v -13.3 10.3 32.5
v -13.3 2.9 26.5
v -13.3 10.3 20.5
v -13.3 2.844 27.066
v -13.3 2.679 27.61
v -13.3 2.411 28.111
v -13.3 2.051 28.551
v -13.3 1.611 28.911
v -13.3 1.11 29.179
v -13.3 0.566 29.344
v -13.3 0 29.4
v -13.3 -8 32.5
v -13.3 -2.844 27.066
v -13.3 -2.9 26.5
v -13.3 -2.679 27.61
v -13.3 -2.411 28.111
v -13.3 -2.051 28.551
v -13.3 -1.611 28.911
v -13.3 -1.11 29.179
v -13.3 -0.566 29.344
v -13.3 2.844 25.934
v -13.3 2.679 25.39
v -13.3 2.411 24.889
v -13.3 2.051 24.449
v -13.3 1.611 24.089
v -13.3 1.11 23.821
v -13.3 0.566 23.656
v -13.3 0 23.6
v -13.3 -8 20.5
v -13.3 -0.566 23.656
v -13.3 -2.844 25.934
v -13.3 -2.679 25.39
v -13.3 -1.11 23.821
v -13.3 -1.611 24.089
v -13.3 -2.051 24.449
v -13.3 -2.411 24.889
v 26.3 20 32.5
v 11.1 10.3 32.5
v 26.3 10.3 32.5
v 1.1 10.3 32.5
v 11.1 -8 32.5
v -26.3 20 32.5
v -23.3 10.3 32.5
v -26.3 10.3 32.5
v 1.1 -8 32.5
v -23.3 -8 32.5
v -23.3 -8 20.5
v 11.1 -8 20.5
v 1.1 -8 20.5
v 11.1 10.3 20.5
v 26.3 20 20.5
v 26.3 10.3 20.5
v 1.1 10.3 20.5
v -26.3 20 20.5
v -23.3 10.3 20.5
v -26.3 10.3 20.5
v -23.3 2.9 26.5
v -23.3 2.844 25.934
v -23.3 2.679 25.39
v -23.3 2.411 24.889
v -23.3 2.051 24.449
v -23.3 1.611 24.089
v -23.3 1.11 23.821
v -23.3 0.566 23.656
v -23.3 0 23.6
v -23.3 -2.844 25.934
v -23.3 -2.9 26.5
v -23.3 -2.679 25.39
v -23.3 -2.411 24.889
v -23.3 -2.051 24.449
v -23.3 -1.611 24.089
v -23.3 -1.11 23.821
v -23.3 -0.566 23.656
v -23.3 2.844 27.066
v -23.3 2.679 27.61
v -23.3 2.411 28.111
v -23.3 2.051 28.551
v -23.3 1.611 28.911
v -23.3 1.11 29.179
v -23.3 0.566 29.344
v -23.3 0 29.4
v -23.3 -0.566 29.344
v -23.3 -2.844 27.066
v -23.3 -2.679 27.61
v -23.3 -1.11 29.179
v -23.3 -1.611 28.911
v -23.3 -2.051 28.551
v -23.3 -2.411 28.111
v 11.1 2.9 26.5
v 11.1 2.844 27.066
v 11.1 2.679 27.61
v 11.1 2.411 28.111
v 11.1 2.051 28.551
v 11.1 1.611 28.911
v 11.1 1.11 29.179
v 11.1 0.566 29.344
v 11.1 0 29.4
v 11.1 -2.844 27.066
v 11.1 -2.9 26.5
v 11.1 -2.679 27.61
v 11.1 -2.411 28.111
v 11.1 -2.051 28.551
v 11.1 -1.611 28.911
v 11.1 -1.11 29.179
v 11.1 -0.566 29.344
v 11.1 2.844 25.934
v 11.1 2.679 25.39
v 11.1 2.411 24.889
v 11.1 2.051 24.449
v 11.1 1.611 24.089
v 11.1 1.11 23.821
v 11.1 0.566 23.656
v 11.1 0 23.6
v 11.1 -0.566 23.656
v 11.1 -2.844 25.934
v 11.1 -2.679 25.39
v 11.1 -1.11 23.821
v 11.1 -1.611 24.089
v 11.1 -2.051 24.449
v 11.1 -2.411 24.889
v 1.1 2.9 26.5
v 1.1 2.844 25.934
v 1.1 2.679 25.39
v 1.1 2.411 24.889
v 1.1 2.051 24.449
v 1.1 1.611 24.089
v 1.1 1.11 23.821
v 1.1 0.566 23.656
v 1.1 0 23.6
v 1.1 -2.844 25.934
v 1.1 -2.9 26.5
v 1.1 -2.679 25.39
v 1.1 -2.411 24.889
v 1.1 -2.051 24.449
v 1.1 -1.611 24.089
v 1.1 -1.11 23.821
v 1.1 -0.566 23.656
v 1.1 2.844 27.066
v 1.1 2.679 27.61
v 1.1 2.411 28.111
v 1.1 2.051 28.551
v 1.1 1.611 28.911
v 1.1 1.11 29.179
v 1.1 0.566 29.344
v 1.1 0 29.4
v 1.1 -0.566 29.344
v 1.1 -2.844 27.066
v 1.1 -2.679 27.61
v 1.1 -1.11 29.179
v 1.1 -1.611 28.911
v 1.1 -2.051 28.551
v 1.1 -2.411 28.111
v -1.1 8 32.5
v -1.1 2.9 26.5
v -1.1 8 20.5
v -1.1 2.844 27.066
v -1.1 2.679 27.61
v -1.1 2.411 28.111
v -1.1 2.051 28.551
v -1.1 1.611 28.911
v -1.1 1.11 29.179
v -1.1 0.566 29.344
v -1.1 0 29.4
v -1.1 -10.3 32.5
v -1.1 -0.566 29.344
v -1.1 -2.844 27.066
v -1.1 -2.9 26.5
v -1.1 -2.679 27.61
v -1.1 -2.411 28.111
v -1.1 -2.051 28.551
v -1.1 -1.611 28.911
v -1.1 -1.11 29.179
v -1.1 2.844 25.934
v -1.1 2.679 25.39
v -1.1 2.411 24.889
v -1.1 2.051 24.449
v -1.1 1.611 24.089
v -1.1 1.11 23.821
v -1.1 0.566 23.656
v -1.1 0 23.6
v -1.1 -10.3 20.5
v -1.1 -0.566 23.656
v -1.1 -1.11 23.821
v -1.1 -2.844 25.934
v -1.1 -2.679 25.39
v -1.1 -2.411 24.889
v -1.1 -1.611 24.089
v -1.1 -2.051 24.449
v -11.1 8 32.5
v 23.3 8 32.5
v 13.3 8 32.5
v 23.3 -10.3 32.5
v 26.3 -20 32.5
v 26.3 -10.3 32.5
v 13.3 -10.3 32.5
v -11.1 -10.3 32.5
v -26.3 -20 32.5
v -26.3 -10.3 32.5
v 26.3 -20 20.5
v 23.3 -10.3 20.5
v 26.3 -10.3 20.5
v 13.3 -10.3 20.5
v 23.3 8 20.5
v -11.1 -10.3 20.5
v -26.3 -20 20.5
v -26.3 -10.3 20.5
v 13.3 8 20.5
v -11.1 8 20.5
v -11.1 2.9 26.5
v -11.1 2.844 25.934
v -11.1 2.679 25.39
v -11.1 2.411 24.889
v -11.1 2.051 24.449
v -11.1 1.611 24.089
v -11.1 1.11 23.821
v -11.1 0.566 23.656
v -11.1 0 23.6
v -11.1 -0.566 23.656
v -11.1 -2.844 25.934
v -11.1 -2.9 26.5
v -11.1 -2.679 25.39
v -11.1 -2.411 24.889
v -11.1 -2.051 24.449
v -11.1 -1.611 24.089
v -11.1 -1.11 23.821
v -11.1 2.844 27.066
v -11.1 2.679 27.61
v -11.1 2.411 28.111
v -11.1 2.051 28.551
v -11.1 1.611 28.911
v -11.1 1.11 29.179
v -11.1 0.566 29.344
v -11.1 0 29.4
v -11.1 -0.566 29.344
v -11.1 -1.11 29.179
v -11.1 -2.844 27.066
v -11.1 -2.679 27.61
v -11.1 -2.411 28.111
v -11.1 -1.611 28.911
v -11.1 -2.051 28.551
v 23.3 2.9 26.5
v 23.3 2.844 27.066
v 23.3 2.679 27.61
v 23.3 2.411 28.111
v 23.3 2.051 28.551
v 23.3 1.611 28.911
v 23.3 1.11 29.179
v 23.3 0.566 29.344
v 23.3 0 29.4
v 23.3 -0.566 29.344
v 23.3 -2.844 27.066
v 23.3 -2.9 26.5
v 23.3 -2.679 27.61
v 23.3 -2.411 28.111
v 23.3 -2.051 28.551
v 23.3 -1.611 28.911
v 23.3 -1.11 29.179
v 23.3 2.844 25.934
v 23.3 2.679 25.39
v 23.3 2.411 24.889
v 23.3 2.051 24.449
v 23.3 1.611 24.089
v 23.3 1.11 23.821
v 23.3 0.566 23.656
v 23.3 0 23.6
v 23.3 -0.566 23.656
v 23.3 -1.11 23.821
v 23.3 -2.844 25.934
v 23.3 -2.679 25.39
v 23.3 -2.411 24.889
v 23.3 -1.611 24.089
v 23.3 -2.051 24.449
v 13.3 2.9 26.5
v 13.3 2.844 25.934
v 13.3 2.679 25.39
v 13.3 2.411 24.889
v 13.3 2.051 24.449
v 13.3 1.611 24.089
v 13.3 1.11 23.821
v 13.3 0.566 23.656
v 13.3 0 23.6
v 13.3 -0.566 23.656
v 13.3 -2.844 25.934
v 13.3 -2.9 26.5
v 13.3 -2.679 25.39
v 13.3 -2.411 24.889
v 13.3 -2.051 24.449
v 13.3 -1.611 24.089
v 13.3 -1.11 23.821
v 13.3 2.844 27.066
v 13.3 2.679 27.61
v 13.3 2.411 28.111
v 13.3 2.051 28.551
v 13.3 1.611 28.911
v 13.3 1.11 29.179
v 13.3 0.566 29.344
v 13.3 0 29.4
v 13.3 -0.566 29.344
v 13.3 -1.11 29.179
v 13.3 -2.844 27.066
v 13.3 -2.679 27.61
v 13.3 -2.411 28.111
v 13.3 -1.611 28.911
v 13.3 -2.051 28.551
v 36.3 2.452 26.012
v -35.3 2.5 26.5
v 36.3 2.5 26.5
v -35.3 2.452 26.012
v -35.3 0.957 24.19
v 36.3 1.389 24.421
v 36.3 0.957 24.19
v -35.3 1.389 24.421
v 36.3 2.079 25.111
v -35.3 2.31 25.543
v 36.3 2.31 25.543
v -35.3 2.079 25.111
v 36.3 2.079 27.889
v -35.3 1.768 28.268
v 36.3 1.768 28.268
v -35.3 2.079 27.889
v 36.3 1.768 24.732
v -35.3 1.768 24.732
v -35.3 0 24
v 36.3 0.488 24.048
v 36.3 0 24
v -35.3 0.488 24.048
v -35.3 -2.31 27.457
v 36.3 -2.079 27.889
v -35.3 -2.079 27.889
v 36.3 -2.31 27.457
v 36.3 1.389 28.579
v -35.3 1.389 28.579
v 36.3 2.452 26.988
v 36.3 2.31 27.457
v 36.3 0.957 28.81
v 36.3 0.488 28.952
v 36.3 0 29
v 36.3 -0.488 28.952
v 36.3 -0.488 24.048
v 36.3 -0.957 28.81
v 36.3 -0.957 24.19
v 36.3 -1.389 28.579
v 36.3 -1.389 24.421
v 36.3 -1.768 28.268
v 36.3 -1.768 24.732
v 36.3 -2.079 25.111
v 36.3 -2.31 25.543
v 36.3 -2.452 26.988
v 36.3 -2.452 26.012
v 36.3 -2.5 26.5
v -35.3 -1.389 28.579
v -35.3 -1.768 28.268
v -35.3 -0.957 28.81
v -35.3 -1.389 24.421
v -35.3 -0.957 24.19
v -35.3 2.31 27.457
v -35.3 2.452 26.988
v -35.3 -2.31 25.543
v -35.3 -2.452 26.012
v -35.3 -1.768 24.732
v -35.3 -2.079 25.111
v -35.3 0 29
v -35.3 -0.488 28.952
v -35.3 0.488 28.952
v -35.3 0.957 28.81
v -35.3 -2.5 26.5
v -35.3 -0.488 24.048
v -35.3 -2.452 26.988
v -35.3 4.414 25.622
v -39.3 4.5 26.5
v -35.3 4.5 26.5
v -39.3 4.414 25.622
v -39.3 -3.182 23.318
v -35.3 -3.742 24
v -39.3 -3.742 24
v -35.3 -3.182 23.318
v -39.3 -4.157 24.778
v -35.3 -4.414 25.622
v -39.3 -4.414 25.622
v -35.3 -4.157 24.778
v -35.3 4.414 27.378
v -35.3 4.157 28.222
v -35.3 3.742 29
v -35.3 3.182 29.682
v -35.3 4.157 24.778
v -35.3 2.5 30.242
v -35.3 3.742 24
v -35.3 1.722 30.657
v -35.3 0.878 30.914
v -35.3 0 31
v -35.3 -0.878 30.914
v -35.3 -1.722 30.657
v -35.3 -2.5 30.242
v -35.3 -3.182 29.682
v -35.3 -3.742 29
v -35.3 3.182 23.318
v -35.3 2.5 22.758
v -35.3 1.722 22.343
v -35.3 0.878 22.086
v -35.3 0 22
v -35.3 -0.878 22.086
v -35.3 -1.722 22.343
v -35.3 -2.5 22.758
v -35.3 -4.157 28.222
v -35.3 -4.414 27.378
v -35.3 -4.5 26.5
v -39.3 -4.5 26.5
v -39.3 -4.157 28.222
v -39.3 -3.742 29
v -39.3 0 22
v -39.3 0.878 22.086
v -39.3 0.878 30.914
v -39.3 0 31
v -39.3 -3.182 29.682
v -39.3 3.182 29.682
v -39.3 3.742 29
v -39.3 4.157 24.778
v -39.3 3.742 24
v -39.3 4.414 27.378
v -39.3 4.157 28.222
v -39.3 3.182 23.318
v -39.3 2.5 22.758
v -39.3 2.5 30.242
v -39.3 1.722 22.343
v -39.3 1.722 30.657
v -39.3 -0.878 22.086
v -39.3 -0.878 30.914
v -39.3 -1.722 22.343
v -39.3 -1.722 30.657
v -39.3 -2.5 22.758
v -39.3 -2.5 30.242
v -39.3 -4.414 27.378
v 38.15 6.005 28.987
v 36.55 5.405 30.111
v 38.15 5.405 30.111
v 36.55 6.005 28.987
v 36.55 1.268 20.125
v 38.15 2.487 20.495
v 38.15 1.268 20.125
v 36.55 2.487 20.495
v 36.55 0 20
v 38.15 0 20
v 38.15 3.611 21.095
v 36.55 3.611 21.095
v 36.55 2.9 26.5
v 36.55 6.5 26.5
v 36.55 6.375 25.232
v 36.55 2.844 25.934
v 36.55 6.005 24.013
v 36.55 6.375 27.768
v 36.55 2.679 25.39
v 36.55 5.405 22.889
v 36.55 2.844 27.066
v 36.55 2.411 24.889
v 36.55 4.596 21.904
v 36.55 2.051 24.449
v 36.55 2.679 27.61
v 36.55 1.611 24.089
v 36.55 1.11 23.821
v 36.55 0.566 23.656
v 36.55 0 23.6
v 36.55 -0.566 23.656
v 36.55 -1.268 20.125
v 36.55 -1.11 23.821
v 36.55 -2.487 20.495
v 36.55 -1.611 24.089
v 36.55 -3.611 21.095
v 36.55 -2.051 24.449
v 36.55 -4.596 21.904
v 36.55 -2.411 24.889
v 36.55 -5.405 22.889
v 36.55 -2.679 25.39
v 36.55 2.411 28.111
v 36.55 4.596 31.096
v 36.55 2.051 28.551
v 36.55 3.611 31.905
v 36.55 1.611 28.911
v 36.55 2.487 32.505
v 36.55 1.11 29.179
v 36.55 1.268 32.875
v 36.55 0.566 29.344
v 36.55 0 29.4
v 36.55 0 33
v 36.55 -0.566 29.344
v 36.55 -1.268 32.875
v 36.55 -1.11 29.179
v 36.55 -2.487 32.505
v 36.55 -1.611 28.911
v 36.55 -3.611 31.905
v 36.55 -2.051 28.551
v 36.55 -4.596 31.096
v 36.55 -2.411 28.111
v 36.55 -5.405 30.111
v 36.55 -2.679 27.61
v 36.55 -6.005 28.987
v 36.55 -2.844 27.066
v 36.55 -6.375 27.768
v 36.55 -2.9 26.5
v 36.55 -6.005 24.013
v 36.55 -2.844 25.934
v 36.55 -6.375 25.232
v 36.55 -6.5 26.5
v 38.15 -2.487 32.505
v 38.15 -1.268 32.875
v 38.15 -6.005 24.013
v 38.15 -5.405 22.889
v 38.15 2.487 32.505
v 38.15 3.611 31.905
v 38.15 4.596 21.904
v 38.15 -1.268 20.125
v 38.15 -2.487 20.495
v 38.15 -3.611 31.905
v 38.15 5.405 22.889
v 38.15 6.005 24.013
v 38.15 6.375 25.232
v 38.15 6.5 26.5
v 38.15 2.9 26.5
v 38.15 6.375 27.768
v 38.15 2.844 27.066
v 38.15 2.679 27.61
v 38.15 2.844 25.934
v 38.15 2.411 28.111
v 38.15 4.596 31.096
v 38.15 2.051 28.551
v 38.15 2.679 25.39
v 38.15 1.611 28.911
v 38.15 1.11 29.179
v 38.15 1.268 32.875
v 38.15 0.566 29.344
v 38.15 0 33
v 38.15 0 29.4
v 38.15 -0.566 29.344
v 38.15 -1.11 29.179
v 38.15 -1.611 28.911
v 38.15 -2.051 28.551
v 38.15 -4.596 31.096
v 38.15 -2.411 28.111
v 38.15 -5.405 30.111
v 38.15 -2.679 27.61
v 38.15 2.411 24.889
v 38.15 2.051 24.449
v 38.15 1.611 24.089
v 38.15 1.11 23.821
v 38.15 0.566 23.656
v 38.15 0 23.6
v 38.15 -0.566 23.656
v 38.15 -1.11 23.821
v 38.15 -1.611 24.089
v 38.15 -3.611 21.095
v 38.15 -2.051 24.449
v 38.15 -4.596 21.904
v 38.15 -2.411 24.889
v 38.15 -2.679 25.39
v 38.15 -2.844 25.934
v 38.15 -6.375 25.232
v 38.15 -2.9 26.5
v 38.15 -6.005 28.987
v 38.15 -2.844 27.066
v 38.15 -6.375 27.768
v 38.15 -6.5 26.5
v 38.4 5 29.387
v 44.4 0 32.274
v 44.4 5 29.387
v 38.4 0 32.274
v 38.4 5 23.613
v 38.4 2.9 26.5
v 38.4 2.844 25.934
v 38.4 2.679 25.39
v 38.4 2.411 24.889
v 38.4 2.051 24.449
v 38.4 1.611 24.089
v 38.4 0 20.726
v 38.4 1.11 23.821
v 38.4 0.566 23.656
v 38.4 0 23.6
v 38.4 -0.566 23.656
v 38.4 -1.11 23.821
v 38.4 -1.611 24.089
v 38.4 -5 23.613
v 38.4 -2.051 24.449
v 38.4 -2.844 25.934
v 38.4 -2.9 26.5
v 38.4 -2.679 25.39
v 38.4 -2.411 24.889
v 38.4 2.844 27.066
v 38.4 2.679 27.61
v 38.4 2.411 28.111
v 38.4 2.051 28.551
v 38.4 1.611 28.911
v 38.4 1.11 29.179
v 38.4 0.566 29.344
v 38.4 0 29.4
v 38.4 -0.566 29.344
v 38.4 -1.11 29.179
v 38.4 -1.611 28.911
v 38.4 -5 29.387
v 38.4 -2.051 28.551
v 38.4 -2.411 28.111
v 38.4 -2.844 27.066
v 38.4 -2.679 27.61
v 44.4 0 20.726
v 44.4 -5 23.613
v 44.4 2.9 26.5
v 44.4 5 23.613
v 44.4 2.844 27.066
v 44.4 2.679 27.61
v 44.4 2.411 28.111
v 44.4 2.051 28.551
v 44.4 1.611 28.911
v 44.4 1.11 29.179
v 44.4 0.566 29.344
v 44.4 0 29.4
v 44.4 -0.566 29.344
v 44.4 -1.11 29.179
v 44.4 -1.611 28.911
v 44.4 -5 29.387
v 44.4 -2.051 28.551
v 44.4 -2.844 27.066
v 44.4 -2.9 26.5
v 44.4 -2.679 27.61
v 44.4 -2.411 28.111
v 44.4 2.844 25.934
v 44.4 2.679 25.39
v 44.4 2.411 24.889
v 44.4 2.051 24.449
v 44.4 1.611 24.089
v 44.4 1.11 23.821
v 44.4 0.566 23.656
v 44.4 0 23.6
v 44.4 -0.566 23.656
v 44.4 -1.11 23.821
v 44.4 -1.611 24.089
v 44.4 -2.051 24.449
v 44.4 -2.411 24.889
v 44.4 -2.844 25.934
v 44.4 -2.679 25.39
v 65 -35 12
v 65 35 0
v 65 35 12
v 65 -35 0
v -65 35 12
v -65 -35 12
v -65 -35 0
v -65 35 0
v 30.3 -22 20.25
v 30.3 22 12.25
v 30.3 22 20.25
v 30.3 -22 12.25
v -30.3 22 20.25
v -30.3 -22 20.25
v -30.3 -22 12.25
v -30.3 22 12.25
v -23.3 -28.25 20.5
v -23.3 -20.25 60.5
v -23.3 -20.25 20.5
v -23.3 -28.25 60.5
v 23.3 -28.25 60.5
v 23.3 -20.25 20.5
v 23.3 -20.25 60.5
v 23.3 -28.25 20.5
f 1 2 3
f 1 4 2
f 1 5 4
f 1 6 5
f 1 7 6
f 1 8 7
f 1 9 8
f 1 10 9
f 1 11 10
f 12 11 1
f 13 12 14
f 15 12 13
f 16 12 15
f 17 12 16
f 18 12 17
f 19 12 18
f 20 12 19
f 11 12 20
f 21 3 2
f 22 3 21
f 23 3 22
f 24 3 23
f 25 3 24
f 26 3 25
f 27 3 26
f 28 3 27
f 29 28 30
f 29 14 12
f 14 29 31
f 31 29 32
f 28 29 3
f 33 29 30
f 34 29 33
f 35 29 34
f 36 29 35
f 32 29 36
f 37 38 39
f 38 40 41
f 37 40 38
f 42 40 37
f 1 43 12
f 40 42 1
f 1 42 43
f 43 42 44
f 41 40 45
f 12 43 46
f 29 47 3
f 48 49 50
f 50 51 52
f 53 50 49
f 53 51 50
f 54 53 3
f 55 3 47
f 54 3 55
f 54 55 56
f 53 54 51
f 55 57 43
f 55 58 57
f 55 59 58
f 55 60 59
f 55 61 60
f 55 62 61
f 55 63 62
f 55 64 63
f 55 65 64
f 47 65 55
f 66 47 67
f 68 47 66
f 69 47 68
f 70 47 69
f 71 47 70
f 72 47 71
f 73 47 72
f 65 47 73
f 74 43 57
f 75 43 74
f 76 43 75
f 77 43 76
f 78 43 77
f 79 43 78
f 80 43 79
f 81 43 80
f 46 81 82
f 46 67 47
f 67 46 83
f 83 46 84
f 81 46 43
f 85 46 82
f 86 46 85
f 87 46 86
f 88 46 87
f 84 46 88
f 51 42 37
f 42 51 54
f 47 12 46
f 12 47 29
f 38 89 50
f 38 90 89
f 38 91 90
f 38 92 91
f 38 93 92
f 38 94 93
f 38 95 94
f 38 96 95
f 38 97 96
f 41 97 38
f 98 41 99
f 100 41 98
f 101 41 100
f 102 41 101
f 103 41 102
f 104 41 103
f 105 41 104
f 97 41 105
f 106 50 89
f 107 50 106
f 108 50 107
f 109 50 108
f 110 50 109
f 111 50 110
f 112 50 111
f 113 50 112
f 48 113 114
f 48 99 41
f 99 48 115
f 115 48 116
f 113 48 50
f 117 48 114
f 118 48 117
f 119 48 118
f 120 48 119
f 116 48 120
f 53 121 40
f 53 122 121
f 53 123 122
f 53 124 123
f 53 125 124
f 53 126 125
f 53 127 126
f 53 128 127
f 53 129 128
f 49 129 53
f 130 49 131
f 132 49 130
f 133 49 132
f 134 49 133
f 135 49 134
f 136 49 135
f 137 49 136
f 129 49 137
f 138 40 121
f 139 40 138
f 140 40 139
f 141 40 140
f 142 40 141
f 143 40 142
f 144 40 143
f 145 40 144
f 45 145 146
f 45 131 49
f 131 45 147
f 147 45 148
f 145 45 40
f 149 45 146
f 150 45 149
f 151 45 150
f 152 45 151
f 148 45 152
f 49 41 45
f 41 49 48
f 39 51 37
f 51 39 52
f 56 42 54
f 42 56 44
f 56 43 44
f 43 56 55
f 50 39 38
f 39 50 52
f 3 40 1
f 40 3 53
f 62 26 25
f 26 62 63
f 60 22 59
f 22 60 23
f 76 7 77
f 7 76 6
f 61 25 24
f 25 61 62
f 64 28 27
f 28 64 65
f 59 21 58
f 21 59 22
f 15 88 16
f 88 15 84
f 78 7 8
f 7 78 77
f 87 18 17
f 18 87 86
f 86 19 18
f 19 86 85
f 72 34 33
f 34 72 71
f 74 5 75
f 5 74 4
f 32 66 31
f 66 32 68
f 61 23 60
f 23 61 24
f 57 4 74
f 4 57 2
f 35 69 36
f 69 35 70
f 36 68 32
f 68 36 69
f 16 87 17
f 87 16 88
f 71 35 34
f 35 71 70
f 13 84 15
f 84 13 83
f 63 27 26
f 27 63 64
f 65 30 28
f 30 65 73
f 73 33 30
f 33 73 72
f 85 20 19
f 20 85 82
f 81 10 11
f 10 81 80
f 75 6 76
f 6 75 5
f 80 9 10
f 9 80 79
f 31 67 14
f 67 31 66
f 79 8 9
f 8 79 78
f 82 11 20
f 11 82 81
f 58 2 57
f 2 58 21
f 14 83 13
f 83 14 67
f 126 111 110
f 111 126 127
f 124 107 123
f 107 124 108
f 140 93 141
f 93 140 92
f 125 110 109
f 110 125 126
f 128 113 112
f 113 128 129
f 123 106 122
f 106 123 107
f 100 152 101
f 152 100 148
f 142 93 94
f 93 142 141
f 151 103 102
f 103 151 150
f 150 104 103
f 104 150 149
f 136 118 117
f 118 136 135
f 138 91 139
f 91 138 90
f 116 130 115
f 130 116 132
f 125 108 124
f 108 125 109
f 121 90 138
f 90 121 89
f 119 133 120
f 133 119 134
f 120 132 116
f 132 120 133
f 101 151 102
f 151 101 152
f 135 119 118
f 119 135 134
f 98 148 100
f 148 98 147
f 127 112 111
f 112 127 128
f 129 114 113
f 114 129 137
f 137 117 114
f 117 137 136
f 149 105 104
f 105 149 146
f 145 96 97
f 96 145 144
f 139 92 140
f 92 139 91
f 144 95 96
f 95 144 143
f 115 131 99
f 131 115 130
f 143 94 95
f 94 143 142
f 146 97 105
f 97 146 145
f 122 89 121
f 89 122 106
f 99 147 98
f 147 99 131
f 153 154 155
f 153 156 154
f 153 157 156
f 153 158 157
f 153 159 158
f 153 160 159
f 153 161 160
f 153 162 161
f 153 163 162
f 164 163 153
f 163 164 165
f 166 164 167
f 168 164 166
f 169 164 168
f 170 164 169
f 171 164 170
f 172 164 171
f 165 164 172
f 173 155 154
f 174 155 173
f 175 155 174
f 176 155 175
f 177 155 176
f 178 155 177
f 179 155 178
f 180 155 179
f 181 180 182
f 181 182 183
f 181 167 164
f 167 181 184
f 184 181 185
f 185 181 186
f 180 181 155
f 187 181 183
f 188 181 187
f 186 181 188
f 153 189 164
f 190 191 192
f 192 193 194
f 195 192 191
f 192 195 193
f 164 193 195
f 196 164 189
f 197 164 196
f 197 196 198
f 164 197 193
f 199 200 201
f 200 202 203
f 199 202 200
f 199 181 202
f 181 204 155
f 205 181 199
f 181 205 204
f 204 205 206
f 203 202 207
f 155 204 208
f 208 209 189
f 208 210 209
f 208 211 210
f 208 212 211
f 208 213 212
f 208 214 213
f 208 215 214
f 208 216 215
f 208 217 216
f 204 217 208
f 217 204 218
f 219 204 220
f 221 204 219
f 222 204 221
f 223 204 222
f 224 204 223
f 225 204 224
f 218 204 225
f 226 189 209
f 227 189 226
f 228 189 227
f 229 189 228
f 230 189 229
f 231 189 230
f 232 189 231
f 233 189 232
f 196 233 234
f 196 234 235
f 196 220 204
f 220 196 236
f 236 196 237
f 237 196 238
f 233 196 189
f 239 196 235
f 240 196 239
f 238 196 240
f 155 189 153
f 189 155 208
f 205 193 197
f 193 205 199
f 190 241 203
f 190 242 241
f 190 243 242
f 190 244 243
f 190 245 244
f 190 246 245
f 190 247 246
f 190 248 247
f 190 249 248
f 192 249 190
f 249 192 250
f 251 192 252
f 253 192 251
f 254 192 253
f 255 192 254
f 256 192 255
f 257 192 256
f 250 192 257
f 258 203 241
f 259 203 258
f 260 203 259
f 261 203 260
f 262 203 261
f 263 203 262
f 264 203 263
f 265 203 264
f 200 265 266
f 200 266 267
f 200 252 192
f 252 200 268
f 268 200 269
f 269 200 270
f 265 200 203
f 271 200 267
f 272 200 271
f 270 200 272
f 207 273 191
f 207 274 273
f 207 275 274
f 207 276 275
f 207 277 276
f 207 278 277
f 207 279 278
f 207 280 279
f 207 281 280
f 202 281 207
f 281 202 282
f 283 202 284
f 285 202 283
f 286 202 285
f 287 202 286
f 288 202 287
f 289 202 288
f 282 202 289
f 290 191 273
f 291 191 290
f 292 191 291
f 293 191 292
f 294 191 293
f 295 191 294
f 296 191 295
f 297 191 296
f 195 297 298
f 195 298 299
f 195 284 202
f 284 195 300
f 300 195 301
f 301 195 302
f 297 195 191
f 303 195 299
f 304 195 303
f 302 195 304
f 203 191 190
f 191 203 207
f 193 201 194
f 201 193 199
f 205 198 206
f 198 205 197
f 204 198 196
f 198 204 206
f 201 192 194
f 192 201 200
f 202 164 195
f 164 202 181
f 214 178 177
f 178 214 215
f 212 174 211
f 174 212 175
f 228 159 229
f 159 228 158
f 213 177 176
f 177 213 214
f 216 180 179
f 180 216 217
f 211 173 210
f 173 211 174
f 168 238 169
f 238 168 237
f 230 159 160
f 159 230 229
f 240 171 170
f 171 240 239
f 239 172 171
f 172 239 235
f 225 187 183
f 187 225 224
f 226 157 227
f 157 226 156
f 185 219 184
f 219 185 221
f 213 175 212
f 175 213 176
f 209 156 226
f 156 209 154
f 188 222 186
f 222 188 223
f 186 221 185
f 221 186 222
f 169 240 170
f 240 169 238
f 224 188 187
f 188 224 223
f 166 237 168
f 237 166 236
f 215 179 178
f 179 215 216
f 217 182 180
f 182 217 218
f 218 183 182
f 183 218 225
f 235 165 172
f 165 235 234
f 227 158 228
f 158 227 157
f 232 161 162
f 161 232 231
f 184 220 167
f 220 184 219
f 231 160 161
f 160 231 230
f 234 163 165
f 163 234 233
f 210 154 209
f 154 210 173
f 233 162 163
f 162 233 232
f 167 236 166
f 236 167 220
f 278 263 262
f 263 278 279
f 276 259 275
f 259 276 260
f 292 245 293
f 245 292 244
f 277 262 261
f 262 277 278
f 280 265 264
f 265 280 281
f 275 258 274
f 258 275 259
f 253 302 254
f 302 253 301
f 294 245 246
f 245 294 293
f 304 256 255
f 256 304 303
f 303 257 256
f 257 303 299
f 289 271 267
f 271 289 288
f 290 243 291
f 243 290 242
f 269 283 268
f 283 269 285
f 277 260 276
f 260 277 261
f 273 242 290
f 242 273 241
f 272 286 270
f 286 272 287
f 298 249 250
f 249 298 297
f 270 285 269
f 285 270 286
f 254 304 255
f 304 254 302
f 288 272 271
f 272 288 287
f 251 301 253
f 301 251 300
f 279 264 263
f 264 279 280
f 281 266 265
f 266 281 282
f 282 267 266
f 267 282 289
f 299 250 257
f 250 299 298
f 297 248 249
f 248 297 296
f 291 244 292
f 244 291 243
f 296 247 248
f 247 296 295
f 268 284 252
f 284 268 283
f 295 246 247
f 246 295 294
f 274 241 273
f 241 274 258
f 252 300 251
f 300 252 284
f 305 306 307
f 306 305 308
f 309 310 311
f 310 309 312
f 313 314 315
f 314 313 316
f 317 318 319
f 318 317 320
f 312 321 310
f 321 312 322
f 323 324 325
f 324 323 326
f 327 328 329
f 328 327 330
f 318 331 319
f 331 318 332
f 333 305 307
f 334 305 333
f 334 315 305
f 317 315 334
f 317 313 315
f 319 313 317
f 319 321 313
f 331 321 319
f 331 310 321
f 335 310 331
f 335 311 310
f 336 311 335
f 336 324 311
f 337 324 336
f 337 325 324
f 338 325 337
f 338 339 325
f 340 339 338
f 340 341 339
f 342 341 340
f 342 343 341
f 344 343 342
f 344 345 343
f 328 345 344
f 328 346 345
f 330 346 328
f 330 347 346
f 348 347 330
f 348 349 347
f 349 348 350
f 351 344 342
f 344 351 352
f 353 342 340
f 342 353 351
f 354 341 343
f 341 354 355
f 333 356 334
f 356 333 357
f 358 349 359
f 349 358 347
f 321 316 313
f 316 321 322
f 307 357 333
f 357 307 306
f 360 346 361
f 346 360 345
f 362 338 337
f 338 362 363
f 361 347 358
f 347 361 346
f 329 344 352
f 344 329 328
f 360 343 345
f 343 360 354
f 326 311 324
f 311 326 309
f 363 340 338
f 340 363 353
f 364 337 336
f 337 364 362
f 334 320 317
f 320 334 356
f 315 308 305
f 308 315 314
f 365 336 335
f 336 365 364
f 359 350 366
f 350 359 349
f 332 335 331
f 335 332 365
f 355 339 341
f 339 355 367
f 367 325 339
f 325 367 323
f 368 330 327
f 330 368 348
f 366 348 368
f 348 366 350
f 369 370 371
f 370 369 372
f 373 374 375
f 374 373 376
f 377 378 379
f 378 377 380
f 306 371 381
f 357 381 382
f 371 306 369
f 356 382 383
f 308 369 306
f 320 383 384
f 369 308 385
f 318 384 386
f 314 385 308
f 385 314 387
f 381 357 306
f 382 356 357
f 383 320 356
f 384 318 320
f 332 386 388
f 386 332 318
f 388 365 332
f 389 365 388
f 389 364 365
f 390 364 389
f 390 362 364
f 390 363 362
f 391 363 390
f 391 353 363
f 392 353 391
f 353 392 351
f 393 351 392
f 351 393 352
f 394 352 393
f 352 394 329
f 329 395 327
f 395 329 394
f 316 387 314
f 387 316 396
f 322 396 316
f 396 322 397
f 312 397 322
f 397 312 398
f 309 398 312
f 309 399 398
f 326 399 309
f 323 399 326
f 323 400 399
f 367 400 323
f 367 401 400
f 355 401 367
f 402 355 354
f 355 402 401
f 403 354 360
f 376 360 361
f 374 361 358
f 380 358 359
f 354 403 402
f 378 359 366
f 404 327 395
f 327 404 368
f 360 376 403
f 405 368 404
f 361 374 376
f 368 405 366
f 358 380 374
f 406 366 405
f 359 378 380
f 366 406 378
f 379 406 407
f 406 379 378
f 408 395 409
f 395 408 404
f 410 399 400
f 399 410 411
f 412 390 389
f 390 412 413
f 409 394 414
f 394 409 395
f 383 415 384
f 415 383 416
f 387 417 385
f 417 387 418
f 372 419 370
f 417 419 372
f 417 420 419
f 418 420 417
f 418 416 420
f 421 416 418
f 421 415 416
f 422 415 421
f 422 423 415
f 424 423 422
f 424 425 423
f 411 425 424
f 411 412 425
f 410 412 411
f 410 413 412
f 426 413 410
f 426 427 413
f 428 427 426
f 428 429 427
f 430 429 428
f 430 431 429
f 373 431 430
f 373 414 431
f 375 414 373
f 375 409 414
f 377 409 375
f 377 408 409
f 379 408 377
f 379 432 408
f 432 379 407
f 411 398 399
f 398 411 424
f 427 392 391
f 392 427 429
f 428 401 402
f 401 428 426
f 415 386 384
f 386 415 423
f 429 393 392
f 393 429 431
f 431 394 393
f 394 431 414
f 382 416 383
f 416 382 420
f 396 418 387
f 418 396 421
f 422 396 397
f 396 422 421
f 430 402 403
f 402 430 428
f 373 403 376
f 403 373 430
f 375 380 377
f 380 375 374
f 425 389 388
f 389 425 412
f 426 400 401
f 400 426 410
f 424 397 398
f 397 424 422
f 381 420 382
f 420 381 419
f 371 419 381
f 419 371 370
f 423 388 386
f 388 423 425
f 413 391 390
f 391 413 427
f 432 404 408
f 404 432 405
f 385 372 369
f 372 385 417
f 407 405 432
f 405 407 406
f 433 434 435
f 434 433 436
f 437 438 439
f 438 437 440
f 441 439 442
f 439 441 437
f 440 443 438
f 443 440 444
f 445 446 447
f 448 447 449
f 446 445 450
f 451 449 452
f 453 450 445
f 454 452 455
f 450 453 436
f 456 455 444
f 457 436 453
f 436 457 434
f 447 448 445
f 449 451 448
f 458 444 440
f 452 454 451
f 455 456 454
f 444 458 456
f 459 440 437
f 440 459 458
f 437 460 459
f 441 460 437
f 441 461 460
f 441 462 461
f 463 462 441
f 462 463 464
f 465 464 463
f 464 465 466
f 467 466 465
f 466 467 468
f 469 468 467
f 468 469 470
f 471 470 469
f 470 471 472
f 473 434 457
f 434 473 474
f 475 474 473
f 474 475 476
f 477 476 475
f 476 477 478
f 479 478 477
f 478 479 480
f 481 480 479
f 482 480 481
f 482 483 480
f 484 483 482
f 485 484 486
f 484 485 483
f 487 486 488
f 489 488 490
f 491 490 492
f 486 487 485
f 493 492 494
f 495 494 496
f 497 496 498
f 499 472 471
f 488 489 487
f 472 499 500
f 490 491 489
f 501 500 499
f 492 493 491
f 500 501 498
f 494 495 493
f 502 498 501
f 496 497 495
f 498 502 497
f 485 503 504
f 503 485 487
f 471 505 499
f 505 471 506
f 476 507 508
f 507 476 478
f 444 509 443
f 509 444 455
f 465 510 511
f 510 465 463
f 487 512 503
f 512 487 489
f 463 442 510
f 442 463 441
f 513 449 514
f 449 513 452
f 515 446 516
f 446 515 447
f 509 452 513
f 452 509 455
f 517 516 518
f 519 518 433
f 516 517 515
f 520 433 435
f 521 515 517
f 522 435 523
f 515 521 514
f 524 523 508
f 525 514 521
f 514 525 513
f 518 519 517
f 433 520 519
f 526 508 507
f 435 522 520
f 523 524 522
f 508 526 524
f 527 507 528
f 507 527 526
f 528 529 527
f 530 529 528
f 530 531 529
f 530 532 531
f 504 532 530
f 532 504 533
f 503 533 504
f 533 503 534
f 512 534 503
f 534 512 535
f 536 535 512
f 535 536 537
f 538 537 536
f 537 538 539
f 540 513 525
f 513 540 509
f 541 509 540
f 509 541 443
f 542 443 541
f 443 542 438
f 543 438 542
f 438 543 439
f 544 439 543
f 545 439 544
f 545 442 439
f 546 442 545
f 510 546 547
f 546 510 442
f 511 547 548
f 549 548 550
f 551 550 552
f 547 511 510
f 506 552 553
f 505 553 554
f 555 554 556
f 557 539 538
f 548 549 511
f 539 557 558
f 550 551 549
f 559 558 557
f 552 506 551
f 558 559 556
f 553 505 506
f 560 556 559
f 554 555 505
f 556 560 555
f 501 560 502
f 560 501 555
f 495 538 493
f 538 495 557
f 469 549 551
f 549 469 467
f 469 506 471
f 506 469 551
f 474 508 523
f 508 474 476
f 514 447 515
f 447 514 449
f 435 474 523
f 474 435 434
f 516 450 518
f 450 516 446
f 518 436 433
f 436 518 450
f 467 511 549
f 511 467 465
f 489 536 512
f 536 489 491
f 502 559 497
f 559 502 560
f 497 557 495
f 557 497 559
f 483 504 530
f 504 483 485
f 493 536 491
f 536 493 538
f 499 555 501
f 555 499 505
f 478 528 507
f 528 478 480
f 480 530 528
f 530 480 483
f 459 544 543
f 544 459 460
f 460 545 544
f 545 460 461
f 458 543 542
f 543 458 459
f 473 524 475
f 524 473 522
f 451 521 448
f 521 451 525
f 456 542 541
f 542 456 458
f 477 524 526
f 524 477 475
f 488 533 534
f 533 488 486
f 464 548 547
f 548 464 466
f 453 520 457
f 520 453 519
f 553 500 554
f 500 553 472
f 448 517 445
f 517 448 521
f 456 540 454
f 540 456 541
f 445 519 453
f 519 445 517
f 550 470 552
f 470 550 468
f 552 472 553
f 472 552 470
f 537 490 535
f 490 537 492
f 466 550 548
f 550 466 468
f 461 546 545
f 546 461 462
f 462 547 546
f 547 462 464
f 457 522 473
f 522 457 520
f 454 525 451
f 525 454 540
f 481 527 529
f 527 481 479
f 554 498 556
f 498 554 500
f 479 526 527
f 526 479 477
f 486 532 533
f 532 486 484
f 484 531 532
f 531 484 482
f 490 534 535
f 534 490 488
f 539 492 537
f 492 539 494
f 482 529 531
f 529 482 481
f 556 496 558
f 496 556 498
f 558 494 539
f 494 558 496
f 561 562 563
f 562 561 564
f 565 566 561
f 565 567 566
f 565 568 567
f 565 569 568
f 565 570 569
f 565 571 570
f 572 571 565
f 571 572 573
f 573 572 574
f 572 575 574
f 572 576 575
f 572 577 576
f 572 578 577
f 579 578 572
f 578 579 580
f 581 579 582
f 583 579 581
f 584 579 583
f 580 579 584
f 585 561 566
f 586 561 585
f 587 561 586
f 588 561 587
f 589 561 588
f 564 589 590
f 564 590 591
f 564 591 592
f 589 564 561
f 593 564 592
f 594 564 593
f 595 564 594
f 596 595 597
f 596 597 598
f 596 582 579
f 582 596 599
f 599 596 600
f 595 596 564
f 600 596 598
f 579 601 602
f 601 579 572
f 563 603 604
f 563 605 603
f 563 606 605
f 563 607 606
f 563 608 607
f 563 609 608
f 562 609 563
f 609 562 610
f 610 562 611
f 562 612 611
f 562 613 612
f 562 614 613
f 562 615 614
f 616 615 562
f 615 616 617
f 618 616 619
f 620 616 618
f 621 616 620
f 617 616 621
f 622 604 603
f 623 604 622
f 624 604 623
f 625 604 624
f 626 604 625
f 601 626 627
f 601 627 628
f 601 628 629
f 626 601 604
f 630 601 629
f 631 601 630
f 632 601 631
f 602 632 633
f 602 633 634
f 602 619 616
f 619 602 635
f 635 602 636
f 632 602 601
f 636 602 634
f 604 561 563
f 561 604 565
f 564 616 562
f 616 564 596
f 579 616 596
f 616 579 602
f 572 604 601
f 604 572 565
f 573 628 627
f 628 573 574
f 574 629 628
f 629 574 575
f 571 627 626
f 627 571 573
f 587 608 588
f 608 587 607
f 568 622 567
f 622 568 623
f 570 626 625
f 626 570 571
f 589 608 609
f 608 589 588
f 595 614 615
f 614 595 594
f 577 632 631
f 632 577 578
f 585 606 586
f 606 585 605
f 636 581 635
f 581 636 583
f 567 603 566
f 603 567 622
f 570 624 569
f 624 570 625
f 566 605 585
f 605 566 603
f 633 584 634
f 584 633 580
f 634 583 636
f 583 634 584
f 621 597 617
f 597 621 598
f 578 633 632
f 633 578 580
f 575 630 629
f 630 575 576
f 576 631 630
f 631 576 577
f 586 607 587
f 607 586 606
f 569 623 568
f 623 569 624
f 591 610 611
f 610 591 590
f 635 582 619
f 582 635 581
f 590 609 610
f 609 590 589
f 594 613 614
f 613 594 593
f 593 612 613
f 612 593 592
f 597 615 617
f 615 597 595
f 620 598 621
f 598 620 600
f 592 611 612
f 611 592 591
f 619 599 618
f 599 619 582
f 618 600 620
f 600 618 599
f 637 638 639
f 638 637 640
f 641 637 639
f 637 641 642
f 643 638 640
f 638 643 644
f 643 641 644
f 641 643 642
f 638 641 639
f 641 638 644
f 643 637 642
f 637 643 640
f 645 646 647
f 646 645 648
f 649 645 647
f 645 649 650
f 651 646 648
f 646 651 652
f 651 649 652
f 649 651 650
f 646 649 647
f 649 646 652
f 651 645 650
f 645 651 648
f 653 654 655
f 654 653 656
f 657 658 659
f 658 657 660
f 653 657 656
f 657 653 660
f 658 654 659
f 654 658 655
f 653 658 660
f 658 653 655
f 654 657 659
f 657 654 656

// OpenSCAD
$fn = 32;

// ------------------------------------------------------------------------
// Comb hinge with flap: leaf 52.6 x 20 mm, pin d5, flap 40 mm
// Every part is its own module, assembly() places every instance.
// ------------------------------------------------------------------------

// --- part 1 ---
module hinge_bed() {
  difference() {
    translate([-65, -35, 0]) cube([130, 70, 12]);
  }
}

// --- part 2 ---
module hinge_riser() {
  difference() {
    translate([-30.3, -22, 0]) cube([60.6, 44, 8]);
  }
}

// --- part 3 ---
module hinge_leaf_a() {
  difference() {
    union() {
      translate([-23.3, -8, -6]) cube([10, 28, 12]);
      translate([1.1, -8, -6]) cube([10, 28, 12]);
      translate([-26.3, 10.3, -6]) cube([52.6, 9.7, 12]);
    }
    translate([-18.3, 0, 0]) rotate([0, 90, 0]) cylinder(h = 12, d = 5.8, center = true);
    translate([6.1, 0, 0]) rotate([0, 90, 0]) cylinder(h = 12, d = 5.8, center = true);
  }
}

// --- part 4 ---
module hinge_leaf_b() {
  difference() {
    union() {
      translate([-11.1, -20, -6]) cube([10, 28, 12]);
      translate([13.3, -20, -6]) cube([10, 28, 12]);
      translate([-26.3, -20, -6]) cube([52.6, 9.7, 12]);
    }
    translate([-6.1, 0, 0]) rotate([0, 90, 0]) cylinder(h = 12, d = 5.8, center = true);
    translate([18.3, 0, 0]) rotate([0, 90, 0]) cylinder(h = 12, d = 5.8, center = true);
  }
}

// --- part 5 ---
module hinge_flap() {
  difference() {
    translate([-23.3, -20, 0]) cube([46.6, 40, 8]);
  }
}

// --- part 6 ---
module hinge_pin() {
  rotate([0, 90, 0]) cylinder(h = 72.6, d = 5, center = true);
  translate([-39.3, 0, 0]) rotate([0, 90, 0]) cylinder(h = 4, d = 9);
}

// --- part 7 ---
module pin_washer() {
  difference() {
      translate([0, 0, 0]) cylinder(h = 1.6, d = 13);
      translate([0, 0, -1]) cylinder(h = 3.6, d = 5.8);
    }
}

// --- part 8 ---
module pin_nut() {
  difference() {
    linear_extrude(height = 6) polygon(points = [[5.774, 0], [2.887, 5], [-2.887, 5], [-5.774, 0], [-2.887, -5], [2.887, -5]]);
    translate([0, 0, -1]) cylinder(h = 8, d = 5.8);
  }
}

// --- assembly ---
module assembly() {
  color([0.80, 0.24, 0.20]) translate([0, 0, 0]) rotate([0, 0, 0]) hinge_bed();
  color([0.20, 0.45, 0.75]) translate([0, 0, 12.25]) rotate([0, 0, 0]) hinge_riser();
  color([0.25, 0.62, 0.32]) translate([0, 0, 26.5]) rotate([0, 0, 0]) hinge_leaf_a();
  color([0.92, 0.70, 0.18]) translate([0, 0, 26.5]) rotate([0, 0, 0]) hinge_leaf_b();
  color([0.58, 0.35, 0.70]) translate([0, -20.25, 40.5]) rotate([90, 0, 0]) hinge_flap();
  color([0.16, 0.66, 0.66]) translate([0, 0, 26.5]) rotate([0, 0, 0]) hinge_pin();
  color([0.85, 0.48, 0.18]) translate([36.55, 0, 26.5]) rotate([0, 90, 0]) pin_washer();
  color([0.55, 0.60, 0.65]) translate([38.4, 0, 26.5]) rotate([0, 90, 0]) pin_nut();
}

assembly();
